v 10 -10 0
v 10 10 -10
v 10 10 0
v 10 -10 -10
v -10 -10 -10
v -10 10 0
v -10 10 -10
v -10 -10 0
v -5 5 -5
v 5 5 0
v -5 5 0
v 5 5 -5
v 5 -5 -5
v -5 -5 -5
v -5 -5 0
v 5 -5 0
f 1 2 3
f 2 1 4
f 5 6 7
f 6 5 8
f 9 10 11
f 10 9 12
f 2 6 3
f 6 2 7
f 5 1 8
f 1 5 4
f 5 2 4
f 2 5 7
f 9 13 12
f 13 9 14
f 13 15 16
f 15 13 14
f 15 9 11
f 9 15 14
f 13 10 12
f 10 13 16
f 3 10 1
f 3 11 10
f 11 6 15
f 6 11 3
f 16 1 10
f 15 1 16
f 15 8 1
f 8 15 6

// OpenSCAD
// Doing a minkowski sum on an object with
// an internal cavity causes rendering artifacts
// in preview mode (similar to convexity issues)
difference() {
  minkowski(convexity=2) {
    difference() {
      cube(19, center = true);
      cube(11, center = true);
    }
    cube(1, center=true);
  }
  translate([0, 0, 15]) cube(30, center=true);
}
